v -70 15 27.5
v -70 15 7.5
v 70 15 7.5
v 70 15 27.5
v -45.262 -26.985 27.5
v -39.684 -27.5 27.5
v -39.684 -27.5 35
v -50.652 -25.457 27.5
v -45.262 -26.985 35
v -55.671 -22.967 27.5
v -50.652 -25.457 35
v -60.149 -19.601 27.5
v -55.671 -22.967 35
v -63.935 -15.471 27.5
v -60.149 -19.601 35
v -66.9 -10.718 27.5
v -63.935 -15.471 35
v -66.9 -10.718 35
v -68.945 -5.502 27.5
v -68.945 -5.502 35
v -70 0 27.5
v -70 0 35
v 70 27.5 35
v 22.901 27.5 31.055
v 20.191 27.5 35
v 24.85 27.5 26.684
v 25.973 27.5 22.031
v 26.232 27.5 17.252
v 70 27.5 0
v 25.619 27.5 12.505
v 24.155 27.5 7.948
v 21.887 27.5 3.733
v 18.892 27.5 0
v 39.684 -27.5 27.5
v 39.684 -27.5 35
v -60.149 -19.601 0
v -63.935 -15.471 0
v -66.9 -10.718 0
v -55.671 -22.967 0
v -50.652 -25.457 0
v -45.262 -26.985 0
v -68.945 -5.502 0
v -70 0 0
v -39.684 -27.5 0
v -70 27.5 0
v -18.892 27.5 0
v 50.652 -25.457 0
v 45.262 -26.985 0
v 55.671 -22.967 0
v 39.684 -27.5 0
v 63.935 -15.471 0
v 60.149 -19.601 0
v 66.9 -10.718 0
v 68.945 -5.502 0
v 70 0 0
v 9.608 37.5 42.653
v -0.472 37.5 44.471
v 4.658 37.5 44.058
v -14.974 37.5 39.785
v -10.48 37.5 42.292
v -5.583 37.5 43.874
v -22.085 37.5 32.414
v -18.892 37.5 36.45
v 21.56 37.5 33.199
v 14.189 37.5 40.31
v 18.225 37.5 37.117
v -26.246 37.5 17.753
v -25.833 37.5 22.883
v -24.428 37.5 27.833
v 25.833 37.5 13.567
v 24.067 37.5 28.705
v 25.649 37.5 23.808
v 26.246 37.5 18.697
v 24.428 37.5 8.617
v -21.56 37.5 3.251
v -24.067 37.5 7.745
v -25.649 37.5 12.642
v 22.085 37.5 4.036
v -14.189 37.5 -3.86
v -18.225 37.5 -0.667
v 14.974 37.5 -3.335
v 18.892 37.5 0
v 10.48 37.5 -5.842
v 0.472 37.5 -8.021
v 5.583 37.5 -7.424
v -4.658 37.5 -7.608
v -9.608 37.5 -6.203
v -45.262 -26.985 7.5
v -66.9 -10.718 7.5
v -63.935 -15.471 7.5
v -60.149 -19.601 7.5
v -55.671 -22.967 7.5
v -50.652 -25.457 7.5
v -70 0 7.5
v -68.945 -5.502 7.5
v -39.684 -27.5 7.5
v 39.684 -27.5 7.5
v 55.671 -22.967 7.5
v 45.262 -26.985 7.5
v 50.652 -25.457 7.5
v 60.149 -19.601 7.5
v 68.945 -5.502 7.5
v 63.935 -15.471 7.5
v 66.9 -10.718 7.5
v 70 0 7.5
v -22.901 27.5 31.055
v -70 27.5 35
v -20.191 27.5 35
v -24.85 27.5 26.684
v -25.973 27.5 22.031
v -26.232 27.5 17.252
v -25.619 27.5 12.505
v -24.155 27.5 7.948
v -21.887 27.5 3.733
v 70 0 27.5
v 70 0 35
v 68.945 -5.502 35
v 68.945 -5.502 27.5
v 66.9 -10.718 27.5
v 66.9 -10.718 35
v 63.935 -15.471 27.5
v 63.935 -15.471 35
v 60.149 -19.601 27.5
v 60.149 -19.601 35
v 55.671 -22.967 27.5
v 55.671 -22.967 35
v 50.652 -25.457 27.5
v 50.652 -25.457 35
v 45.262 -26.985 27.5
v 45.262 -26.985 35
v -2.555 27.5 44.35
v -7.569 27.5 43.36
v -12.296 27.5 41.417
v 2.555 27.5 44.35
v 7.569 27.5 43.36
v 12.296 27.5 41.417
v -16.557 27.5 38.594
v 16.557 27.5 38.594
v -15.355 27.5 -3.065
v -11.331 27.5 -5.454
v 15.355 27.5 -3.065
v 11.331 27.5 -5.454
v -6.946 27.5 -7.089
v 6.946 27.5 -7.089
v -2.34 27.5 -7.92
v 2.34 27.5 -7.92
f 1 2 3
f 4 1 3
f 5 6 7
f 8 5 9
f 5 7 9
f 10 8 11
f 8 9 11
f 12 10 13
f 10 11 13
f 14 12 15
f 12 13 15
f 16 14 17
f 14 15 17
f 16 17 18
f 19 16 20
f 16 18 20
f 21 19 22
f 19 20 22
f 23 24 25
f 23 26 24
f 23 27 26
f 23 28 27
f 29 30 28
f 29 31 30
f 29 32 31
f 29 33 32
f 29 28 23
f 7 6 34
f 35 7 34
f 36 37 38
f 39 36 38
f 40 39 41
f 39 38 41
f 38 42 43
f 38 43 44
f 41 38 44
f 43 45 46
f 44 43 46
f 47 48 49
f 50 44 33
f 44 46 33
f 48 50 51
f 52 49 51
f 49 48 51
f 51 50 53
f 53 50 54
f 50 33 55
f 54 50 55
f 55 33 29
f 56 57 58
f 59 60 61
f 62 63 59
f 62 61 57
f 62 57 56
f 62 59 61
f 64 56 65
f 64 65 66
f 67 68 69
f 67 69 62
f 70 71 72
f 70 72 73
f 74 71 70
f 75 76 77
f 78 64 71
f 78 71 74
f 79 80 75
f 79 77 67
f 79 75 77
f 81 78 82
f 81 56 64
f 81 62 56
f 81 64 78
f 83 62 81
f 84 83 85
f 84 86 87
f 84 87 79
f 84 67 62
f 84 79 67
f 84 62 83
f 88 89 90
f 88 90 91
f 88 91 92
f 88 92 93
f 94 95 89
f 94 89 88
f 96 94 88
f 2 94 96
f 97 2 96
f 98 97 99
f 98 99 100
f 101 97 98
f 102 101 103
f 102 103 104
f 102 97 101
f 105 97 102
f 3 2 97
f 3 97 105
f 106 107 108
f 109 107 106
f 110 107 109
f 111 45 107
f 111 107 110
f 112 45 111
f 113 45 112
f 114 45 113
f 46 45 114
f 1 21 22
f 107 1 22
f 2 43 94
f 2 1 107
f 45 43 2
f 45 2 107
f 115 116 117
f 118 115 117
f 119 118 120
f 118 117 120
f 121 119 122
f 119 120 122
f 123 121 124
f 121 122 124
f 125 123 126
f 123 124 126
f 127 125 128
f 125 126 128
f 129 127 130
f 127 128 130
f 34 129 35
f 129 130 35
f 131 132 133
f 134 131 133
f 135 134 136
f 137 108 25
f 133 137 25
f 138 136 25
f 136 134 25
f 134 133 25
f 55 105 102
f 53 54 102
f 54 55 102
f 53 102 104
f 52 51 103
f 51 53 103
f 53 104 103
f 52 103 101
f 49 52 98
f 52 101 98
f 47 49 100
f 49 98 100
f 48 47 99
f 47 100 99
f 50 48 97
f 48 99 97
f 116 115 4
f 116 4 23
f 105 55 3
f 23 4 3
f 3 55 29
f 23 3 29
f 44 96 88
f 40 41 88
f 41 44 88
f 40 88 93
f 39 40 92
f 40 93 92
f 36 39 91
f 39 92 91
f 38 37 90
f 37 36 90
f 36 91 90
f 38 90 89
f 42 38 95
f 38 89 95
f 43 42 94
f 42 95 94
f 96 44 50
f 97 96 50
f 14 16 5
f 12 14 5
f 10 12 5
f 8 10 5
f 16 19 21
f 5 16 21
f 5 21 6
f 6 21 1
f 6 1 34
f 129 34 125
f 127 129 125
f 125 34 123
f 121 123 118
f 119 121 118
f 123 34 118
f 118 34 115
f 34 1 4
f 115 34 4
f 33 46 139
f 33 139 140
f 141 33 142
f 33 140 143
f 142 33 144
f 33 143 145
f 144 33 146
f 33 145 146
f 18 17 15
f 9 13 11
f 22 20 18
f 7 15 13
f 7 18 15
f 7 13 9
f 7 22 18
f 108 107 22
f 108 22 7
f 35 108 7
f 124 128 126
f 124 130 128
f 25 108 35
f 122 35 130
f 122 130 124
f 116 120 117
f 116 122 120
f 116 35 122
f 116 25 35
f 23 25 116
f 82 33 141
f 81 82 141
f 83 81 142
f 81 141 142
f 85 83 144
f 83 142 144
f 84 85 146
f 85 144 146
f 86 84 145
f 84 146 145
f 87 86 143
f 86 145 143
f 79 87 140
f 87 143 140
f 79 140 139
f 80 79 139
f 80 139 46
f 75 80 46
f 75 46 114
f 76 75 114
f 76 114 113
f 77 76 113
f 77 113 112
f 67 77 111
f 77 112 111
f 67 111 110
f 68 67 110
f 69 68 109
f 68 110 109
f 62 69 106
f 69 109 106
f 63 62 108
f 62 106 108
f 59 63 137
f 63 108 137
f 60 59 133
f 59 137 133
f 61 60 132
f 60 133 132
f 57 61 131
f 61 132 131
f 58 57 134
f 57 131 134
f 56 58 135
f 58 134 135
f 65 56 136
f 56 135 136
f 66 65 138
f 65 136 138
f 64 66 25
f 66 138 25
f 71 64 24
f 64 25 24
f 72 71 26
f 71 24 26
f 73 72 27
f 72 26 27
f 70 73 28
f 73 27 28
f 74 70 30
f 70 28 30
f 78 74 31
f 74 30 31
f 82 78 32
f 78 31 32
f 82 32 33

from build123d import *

# Parameters (mm, degrees)
SKETCH1_W           = 140
SKETCH1_H           = 55
BOSS_EXTRUDE1_DEPTH = 35
CUT_EXTRUDE1_DEPTH  = 120
SKETCH4_R           = 26.25
BOSS_EXTRUDE2_DEPTH = 10
SKETCH5_W           = 140
SKETCH5_H           = 20
CUT_EXTRUDE2_DEPTH  = 94.189460294


with BuildPart() as part:
    # Sketch1 → Boss-Extrude1 (new body)
    with BuildSketch(Plane.XY):
        Rectangle(SKETCH1_W, SKETCH1_H)
    extrude(amount=BOSS_EXTRUDE1_DEPTH)

    # Sketch2 → Cut-Extrude1 (cut)
    with BuildSketch(Plane.XY.offset(35)):
        with BuildLine():
            ThreePointArc((70, 0), (60.149153929, -19.600749097), (39.683808374, -27.5))
            Line((39.683808374, -27.5), (70, -27.5))
            Line((70, -27.5), (70, 0))
        make_face()
        with BuildLine():
            Line((-70, -27.5), (-39.683808374, -27.5))
            ThreePointArc((-39.683808374, -27.5), (-60.149153929, -19.600749097), (-70, 0))
            Line((-70, 0), (-70, -27.5))
        make_face()
    extrude(amount=-CUT_EXTRUDE1_DEPTH, mode=Mode.SUBTRACT)

    # Sketch4 → Boss-Extrude2 (add)
    with BuildSketch(Plane(origin=(0, 27.5, 0), x_dir=(1, 0, 0), z_dir=(0, 1, 0))):
        with Locations(Location((0, -18.224998705, 0), (0, 0, 43.97032124))):
            Circle(SKETCH4_R)
    extrude(amount=BOSS_EXTRUDE2_DEPTH)

    # Sketch5 → Cut-Extrude2 (cut, through all)
    with BuildSketch(Plane(origin=(0, 15, 0), x_dir=(1, 0, 0), z_dir=(0, 1, 0))):
        with Locations((0, -17.5)):
            Rectangle(SKETCH5_W, SKETCH5_H)
    extrude(amount=-CUT_EXTRUDE2_DEPTH, mode=Mode.SUBTRACT)


solid = part.part
